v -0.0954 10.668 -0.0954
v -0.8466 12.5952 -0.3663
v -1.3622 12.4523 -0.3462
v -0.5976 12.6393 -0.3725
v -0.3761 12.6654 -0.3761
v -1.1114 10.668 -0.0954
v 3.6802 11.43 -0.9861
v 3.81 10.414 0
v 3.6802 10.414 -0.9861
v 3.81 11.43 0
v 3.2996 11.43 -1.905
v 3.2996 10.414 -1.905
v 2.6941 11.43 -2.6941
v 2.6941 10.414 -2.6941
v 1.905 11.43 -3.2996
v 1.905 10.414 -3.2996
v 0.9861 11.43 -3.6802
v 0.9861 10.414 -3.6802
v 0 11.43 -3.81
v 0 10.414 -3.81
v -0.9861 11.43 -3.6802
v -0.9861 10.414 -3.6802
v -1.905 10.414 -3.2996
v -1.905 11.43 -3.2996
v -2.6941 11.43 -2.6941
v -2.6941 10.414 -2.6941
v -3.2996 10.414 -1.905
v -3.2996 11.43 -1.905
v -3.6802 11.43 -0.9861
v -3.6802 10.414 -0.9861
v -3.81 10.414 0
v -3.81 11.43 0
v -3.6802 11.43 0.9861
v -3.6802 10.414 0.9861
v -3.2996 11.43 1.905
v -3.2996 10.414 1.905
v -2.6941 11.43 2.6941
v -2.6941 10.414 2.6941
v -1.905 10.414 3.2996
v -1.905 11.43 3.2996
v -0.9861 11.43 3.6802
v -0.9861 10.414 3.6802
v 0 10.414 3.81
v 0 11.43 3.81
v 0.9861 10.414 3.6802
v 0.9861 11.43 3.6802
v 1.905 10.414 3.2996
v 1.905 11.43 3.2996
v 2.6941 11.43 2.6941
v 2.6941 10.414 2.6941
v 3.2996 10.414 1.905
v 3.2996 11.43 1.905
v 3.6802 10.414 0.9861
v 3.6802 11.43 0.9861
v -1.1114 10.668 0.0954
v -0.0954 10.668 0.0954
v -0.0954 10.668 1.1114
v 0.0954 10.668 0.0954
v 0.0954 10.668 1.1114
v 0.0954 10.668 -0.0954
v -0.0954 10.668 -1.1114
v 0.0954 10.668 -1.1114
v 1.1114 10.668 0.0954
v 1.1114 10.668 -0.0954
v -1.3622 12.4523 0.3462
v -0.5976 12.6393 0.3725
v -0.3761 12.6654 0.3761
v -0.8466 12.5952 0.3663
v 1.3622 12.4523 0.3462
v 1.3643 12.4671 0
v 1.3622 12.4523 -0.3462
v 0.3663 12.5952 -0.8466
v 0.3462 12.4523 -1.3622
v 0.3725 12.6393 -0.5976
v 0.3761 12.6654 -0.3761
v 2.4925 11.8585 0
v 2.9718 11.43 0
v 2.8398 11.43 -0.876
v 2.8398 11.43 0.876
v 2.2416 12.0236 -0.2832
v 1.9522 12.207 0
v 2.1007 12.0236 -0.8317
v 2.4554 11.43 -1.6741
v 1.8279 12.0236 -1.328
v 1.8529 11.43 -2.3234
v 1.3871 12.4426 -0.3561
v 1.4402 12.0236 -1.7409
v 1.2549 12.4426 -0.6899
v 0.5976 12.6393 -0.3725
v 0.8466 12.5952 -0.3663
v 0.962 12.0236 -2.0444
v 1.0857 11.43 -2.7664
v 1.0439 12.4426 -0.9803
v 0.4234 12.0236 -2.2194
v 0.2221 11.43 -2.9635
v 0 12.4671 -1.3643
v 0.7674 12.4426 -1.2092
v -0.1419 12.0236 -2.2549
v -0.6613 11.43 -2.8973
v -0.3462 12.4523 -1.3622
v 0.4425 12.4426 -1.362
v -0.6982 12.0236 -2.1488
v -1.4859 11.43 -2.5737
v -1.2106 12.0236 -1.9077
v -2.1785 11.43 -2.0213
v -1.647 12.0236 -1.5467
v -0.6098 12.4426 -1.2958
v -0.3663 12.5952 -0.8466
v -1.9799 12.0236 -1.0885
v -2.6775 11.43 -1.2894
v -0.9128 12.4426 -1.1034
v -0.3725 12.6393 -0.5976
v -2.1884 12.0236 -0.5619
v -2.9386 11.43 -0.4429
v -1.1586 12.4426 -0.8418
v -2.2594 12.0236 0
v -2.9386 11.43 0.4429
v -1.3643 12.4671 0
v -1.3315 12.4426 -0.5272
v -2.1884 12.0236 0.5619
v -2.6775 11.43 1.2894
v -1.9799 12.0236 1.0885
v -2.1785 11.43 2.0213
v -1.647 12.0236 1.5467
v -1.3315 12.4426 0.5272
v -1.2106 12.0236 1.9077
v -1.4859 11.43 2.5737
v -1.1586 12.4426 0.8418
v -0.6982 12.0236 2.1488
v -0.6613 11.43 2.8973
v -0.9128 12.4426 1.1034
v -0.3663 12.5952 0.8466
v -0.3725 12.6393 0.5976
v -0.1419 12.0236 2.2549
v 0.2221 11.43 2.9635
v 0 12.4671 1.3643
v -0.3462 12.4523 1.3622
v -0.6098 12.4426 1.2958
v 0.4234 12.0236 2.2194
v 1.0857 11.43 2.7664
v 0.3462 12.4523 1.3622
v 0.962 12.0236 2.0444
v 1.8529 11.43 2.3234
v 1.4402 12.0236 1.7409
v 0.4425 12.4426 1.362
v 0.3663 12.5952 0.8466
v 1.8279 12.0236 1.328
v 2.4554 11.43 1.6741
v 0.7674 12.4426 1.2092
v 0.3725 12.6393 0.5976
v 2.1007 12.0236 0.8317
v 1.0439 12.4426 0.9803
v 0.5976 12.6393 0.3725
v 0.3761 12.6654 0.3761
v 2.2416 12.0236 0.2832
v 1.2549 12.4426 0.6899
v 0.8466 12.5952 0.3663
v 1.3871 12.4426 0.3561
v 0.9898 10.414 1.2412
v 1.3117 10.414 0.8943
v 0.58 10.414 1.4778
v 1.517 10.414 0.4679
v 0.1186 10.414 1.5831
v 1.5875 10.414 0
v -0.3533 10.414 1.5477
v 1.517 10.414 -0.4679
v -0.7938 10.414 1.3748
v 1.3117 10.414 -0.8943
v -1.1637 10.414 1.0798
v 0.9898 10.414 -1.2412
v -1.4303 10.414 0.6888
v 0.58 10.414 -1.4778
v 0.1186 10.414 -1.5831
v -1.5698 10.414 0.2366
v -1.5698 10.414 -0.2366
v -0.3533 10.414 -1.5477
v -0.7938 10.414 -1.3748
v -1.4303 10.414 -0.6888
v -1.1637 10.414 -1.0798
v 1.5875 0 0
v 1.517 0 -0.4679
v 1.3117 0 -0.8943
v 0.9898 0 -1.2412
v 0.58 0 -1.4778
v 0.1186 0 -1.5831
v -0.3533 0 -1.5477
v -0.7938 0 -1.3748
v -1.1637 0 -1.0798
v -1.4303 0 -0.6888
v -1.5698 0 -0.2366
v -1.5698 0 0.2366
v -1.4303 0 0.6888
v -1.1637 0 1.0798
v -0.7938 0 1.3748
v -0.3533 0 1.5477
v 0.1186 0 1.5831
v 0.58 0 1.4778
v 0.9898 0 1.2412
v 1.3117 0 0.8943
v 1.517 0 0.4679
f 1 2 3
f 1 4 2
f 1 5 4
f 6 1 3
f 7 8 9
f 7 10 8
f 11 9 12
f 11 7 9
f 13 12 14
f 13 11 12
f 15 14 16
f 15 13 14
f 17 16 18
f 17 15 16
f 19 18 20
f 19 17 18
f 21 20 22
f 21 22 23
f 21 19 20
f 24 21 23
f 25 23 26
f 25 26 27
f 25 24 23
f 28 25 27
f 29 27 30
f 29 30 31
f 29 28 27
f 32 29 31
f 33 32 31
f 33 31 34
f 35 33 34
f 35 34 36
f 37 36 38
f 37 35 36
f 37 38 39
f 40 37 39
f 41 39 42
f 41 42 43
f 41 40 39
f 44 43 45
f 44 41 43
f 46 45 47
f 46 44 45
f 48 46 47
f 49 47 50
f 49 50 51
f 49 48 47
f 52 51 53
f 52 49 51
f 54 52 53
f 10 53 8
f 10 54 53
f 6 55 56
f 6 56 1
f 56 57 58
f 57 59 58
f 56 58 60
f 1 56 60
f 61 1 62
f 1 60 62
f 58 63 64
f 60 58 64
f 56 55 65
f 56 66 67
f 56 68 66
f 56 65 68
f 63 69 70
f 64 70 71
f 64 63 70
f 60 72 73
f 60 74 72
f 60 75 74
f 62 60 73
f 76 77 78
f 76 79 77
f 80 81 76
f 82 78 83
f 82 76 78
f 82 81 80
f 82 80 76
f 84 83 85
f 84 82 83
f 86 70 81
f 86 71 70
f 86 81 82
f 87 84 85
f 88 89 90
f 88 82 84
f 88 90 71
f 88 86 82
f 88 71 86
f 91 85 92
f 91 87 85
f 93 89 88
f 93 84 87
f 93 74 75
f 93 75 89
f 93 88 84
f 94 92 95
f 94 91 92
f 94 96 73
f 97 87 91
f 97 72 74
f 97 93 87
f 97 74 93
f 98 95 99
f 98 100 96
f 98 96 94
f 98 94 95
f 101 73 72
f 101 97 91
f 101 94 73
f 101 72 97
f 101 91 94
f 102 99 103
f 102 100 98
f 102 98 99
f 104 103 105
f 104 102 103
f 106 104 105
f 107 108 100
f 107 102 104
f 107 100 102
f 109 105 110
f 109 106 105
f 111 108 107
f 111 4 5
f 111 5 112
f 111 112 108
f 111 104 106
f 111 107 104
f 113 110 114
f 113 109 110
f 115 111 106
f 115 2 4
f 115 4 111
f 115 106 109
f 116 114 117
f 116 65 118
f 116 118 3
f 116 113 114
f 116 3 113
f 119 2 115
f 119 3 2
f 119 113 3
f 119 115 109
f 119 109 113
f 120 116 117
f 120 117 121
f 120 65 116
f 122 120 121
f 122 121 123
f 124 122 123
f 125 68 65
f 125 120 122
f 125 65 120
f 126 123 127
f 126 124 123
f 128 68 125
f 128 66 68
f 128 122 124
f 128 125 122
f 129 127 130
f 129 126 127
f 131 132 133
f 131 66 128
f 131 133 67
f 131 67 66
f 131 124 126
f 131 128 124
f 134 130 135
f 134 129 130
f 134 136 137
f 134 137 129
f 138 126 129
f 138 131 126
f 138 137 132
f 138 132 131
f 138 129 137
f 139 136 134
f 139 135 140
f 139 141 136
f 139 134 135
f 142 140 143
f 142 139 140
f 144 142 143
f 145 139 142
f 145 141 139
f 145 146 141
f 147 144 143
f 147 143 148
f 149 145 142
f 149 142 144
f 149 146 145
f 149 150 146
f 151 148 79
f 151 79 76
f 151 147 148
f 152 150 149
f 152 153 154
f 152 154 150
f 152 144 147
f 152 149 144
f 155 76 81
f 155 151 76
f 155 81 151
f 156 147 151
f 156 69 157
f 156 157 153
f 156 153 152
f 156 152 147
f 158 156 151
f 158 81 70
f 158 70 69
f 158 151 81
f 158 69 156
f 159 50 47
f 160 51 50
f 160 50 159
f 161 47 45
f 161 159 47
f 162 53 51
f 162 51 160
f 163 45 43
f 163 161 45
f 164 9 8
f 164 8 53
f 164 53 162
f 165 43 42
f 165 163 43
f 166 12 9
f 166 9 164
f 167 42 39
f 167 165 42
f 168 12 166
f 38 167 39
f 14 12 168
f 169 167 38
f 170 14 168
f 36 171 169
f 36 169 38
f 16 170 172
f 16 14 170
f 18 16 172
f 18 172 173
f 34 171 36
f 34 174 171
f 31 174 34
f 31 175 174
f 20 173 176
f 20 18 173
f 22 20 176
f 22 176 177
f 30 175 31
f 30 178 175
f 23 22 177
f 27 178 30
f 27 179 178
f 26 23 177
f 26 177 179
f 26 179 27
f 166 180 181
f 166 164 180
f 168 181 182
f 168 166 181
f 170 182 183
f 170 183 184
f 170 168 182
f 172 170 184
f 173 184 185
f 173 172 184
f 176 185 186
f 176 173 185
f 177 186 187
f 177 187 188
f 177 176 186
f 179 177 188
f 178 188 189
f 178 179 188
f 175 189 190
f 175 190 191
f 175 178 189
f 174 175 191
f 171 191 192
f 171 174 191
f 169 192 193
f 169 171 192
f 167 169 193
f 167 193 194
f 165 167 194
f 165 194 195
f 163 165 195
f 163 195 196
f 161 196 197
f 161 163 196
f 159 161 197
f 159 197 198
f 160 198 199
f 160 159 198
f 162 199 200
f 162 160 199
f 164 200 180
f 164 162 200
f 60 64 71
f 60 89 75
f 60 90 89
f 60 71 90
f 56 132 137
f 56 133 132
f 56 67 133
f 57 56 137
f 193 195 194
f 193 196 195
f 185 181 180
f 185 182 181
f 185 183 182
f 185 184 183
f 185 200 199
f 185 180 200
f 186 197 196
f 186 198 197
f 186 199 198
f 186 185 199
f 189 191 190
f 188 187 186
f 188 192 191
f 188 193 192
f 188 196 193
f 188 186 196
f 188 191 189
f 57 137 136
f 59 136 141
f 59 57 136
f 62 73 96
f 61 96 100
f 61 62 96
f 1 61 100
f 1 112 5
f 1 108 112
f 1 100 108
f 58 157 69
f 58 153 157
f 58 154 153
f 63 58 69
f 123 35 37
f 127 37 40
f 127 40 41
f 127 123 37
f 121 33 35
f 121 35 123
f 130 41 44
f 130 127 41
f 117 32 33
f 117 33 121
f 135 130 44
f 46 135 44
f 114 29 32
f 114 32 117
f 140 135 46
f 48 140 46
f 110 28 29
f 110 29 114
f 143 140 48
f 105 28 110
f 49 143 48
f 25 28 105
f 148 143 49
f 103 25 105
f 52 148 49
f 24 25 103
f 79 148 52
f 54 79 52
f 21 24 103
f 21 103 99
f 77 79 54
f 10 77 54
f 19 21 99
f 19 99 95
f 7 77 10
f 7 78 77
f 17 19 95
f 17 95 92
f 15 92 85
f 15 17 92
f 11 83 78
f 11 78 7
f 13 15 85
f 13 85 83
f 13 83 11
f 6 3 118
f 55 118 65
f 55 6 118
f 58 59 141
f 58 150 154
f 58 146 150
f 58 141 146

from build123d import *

# Parameters (mm, degrees)
CUT_EXTRUDE1_DEPTH = 2.032
CUT_EXTRUDE1_TAPER = 8


with BuildPart() as part:
    # Sketch1 → Base-Revolve (revolve)
    with BuildSketch(Plane.XY):
        with BuildLine():
            Line((0, 0), (1.5875, 0))
            Line((1.5875, 0), (1.5875, 10.414))
            Line((1.5875, 10.414), (3.81, 10.414))
            Line((3.81, 10.414), (3.81, 11.43))
            Line((3.81, 11.43), (2.9718, 11.43))
            ThreePointArc((2.9718, 11.43), (1.615897215, 12.369193484), (0, 12.7))
            Line((0, 12.7), (0, 0))
        make_face()
    revolve(axis=Axis((0, 0, 0), (0, 1, 0)))

    # Sketch2 → Cut-Extrude1 (cut)
    with BuildSketch(Plane(origin=(0, 12.7, 0), x_dir=(-1, 0, 0), z_dir=(0, 1, 0))):
        Polygon((0.381, 1.397), (-0.381, 1.397), (-0.381, 0.381), (-1.397, 0.381), (-1.397, -0.381), (-0.381, -0.381), (-0.381, -1.397), (0.381, -1.397), (0.381, -0.381), (1.397, -0.381), (1.397, 0.381), (0.381, 0.381), align=None)
    extrude(amount=-CUT_EXTRUDE1_DEPTH, taper=CUT_EXTRUDE1_TAPER, mode=Mode.SUBTRACT)


solid = part.part
